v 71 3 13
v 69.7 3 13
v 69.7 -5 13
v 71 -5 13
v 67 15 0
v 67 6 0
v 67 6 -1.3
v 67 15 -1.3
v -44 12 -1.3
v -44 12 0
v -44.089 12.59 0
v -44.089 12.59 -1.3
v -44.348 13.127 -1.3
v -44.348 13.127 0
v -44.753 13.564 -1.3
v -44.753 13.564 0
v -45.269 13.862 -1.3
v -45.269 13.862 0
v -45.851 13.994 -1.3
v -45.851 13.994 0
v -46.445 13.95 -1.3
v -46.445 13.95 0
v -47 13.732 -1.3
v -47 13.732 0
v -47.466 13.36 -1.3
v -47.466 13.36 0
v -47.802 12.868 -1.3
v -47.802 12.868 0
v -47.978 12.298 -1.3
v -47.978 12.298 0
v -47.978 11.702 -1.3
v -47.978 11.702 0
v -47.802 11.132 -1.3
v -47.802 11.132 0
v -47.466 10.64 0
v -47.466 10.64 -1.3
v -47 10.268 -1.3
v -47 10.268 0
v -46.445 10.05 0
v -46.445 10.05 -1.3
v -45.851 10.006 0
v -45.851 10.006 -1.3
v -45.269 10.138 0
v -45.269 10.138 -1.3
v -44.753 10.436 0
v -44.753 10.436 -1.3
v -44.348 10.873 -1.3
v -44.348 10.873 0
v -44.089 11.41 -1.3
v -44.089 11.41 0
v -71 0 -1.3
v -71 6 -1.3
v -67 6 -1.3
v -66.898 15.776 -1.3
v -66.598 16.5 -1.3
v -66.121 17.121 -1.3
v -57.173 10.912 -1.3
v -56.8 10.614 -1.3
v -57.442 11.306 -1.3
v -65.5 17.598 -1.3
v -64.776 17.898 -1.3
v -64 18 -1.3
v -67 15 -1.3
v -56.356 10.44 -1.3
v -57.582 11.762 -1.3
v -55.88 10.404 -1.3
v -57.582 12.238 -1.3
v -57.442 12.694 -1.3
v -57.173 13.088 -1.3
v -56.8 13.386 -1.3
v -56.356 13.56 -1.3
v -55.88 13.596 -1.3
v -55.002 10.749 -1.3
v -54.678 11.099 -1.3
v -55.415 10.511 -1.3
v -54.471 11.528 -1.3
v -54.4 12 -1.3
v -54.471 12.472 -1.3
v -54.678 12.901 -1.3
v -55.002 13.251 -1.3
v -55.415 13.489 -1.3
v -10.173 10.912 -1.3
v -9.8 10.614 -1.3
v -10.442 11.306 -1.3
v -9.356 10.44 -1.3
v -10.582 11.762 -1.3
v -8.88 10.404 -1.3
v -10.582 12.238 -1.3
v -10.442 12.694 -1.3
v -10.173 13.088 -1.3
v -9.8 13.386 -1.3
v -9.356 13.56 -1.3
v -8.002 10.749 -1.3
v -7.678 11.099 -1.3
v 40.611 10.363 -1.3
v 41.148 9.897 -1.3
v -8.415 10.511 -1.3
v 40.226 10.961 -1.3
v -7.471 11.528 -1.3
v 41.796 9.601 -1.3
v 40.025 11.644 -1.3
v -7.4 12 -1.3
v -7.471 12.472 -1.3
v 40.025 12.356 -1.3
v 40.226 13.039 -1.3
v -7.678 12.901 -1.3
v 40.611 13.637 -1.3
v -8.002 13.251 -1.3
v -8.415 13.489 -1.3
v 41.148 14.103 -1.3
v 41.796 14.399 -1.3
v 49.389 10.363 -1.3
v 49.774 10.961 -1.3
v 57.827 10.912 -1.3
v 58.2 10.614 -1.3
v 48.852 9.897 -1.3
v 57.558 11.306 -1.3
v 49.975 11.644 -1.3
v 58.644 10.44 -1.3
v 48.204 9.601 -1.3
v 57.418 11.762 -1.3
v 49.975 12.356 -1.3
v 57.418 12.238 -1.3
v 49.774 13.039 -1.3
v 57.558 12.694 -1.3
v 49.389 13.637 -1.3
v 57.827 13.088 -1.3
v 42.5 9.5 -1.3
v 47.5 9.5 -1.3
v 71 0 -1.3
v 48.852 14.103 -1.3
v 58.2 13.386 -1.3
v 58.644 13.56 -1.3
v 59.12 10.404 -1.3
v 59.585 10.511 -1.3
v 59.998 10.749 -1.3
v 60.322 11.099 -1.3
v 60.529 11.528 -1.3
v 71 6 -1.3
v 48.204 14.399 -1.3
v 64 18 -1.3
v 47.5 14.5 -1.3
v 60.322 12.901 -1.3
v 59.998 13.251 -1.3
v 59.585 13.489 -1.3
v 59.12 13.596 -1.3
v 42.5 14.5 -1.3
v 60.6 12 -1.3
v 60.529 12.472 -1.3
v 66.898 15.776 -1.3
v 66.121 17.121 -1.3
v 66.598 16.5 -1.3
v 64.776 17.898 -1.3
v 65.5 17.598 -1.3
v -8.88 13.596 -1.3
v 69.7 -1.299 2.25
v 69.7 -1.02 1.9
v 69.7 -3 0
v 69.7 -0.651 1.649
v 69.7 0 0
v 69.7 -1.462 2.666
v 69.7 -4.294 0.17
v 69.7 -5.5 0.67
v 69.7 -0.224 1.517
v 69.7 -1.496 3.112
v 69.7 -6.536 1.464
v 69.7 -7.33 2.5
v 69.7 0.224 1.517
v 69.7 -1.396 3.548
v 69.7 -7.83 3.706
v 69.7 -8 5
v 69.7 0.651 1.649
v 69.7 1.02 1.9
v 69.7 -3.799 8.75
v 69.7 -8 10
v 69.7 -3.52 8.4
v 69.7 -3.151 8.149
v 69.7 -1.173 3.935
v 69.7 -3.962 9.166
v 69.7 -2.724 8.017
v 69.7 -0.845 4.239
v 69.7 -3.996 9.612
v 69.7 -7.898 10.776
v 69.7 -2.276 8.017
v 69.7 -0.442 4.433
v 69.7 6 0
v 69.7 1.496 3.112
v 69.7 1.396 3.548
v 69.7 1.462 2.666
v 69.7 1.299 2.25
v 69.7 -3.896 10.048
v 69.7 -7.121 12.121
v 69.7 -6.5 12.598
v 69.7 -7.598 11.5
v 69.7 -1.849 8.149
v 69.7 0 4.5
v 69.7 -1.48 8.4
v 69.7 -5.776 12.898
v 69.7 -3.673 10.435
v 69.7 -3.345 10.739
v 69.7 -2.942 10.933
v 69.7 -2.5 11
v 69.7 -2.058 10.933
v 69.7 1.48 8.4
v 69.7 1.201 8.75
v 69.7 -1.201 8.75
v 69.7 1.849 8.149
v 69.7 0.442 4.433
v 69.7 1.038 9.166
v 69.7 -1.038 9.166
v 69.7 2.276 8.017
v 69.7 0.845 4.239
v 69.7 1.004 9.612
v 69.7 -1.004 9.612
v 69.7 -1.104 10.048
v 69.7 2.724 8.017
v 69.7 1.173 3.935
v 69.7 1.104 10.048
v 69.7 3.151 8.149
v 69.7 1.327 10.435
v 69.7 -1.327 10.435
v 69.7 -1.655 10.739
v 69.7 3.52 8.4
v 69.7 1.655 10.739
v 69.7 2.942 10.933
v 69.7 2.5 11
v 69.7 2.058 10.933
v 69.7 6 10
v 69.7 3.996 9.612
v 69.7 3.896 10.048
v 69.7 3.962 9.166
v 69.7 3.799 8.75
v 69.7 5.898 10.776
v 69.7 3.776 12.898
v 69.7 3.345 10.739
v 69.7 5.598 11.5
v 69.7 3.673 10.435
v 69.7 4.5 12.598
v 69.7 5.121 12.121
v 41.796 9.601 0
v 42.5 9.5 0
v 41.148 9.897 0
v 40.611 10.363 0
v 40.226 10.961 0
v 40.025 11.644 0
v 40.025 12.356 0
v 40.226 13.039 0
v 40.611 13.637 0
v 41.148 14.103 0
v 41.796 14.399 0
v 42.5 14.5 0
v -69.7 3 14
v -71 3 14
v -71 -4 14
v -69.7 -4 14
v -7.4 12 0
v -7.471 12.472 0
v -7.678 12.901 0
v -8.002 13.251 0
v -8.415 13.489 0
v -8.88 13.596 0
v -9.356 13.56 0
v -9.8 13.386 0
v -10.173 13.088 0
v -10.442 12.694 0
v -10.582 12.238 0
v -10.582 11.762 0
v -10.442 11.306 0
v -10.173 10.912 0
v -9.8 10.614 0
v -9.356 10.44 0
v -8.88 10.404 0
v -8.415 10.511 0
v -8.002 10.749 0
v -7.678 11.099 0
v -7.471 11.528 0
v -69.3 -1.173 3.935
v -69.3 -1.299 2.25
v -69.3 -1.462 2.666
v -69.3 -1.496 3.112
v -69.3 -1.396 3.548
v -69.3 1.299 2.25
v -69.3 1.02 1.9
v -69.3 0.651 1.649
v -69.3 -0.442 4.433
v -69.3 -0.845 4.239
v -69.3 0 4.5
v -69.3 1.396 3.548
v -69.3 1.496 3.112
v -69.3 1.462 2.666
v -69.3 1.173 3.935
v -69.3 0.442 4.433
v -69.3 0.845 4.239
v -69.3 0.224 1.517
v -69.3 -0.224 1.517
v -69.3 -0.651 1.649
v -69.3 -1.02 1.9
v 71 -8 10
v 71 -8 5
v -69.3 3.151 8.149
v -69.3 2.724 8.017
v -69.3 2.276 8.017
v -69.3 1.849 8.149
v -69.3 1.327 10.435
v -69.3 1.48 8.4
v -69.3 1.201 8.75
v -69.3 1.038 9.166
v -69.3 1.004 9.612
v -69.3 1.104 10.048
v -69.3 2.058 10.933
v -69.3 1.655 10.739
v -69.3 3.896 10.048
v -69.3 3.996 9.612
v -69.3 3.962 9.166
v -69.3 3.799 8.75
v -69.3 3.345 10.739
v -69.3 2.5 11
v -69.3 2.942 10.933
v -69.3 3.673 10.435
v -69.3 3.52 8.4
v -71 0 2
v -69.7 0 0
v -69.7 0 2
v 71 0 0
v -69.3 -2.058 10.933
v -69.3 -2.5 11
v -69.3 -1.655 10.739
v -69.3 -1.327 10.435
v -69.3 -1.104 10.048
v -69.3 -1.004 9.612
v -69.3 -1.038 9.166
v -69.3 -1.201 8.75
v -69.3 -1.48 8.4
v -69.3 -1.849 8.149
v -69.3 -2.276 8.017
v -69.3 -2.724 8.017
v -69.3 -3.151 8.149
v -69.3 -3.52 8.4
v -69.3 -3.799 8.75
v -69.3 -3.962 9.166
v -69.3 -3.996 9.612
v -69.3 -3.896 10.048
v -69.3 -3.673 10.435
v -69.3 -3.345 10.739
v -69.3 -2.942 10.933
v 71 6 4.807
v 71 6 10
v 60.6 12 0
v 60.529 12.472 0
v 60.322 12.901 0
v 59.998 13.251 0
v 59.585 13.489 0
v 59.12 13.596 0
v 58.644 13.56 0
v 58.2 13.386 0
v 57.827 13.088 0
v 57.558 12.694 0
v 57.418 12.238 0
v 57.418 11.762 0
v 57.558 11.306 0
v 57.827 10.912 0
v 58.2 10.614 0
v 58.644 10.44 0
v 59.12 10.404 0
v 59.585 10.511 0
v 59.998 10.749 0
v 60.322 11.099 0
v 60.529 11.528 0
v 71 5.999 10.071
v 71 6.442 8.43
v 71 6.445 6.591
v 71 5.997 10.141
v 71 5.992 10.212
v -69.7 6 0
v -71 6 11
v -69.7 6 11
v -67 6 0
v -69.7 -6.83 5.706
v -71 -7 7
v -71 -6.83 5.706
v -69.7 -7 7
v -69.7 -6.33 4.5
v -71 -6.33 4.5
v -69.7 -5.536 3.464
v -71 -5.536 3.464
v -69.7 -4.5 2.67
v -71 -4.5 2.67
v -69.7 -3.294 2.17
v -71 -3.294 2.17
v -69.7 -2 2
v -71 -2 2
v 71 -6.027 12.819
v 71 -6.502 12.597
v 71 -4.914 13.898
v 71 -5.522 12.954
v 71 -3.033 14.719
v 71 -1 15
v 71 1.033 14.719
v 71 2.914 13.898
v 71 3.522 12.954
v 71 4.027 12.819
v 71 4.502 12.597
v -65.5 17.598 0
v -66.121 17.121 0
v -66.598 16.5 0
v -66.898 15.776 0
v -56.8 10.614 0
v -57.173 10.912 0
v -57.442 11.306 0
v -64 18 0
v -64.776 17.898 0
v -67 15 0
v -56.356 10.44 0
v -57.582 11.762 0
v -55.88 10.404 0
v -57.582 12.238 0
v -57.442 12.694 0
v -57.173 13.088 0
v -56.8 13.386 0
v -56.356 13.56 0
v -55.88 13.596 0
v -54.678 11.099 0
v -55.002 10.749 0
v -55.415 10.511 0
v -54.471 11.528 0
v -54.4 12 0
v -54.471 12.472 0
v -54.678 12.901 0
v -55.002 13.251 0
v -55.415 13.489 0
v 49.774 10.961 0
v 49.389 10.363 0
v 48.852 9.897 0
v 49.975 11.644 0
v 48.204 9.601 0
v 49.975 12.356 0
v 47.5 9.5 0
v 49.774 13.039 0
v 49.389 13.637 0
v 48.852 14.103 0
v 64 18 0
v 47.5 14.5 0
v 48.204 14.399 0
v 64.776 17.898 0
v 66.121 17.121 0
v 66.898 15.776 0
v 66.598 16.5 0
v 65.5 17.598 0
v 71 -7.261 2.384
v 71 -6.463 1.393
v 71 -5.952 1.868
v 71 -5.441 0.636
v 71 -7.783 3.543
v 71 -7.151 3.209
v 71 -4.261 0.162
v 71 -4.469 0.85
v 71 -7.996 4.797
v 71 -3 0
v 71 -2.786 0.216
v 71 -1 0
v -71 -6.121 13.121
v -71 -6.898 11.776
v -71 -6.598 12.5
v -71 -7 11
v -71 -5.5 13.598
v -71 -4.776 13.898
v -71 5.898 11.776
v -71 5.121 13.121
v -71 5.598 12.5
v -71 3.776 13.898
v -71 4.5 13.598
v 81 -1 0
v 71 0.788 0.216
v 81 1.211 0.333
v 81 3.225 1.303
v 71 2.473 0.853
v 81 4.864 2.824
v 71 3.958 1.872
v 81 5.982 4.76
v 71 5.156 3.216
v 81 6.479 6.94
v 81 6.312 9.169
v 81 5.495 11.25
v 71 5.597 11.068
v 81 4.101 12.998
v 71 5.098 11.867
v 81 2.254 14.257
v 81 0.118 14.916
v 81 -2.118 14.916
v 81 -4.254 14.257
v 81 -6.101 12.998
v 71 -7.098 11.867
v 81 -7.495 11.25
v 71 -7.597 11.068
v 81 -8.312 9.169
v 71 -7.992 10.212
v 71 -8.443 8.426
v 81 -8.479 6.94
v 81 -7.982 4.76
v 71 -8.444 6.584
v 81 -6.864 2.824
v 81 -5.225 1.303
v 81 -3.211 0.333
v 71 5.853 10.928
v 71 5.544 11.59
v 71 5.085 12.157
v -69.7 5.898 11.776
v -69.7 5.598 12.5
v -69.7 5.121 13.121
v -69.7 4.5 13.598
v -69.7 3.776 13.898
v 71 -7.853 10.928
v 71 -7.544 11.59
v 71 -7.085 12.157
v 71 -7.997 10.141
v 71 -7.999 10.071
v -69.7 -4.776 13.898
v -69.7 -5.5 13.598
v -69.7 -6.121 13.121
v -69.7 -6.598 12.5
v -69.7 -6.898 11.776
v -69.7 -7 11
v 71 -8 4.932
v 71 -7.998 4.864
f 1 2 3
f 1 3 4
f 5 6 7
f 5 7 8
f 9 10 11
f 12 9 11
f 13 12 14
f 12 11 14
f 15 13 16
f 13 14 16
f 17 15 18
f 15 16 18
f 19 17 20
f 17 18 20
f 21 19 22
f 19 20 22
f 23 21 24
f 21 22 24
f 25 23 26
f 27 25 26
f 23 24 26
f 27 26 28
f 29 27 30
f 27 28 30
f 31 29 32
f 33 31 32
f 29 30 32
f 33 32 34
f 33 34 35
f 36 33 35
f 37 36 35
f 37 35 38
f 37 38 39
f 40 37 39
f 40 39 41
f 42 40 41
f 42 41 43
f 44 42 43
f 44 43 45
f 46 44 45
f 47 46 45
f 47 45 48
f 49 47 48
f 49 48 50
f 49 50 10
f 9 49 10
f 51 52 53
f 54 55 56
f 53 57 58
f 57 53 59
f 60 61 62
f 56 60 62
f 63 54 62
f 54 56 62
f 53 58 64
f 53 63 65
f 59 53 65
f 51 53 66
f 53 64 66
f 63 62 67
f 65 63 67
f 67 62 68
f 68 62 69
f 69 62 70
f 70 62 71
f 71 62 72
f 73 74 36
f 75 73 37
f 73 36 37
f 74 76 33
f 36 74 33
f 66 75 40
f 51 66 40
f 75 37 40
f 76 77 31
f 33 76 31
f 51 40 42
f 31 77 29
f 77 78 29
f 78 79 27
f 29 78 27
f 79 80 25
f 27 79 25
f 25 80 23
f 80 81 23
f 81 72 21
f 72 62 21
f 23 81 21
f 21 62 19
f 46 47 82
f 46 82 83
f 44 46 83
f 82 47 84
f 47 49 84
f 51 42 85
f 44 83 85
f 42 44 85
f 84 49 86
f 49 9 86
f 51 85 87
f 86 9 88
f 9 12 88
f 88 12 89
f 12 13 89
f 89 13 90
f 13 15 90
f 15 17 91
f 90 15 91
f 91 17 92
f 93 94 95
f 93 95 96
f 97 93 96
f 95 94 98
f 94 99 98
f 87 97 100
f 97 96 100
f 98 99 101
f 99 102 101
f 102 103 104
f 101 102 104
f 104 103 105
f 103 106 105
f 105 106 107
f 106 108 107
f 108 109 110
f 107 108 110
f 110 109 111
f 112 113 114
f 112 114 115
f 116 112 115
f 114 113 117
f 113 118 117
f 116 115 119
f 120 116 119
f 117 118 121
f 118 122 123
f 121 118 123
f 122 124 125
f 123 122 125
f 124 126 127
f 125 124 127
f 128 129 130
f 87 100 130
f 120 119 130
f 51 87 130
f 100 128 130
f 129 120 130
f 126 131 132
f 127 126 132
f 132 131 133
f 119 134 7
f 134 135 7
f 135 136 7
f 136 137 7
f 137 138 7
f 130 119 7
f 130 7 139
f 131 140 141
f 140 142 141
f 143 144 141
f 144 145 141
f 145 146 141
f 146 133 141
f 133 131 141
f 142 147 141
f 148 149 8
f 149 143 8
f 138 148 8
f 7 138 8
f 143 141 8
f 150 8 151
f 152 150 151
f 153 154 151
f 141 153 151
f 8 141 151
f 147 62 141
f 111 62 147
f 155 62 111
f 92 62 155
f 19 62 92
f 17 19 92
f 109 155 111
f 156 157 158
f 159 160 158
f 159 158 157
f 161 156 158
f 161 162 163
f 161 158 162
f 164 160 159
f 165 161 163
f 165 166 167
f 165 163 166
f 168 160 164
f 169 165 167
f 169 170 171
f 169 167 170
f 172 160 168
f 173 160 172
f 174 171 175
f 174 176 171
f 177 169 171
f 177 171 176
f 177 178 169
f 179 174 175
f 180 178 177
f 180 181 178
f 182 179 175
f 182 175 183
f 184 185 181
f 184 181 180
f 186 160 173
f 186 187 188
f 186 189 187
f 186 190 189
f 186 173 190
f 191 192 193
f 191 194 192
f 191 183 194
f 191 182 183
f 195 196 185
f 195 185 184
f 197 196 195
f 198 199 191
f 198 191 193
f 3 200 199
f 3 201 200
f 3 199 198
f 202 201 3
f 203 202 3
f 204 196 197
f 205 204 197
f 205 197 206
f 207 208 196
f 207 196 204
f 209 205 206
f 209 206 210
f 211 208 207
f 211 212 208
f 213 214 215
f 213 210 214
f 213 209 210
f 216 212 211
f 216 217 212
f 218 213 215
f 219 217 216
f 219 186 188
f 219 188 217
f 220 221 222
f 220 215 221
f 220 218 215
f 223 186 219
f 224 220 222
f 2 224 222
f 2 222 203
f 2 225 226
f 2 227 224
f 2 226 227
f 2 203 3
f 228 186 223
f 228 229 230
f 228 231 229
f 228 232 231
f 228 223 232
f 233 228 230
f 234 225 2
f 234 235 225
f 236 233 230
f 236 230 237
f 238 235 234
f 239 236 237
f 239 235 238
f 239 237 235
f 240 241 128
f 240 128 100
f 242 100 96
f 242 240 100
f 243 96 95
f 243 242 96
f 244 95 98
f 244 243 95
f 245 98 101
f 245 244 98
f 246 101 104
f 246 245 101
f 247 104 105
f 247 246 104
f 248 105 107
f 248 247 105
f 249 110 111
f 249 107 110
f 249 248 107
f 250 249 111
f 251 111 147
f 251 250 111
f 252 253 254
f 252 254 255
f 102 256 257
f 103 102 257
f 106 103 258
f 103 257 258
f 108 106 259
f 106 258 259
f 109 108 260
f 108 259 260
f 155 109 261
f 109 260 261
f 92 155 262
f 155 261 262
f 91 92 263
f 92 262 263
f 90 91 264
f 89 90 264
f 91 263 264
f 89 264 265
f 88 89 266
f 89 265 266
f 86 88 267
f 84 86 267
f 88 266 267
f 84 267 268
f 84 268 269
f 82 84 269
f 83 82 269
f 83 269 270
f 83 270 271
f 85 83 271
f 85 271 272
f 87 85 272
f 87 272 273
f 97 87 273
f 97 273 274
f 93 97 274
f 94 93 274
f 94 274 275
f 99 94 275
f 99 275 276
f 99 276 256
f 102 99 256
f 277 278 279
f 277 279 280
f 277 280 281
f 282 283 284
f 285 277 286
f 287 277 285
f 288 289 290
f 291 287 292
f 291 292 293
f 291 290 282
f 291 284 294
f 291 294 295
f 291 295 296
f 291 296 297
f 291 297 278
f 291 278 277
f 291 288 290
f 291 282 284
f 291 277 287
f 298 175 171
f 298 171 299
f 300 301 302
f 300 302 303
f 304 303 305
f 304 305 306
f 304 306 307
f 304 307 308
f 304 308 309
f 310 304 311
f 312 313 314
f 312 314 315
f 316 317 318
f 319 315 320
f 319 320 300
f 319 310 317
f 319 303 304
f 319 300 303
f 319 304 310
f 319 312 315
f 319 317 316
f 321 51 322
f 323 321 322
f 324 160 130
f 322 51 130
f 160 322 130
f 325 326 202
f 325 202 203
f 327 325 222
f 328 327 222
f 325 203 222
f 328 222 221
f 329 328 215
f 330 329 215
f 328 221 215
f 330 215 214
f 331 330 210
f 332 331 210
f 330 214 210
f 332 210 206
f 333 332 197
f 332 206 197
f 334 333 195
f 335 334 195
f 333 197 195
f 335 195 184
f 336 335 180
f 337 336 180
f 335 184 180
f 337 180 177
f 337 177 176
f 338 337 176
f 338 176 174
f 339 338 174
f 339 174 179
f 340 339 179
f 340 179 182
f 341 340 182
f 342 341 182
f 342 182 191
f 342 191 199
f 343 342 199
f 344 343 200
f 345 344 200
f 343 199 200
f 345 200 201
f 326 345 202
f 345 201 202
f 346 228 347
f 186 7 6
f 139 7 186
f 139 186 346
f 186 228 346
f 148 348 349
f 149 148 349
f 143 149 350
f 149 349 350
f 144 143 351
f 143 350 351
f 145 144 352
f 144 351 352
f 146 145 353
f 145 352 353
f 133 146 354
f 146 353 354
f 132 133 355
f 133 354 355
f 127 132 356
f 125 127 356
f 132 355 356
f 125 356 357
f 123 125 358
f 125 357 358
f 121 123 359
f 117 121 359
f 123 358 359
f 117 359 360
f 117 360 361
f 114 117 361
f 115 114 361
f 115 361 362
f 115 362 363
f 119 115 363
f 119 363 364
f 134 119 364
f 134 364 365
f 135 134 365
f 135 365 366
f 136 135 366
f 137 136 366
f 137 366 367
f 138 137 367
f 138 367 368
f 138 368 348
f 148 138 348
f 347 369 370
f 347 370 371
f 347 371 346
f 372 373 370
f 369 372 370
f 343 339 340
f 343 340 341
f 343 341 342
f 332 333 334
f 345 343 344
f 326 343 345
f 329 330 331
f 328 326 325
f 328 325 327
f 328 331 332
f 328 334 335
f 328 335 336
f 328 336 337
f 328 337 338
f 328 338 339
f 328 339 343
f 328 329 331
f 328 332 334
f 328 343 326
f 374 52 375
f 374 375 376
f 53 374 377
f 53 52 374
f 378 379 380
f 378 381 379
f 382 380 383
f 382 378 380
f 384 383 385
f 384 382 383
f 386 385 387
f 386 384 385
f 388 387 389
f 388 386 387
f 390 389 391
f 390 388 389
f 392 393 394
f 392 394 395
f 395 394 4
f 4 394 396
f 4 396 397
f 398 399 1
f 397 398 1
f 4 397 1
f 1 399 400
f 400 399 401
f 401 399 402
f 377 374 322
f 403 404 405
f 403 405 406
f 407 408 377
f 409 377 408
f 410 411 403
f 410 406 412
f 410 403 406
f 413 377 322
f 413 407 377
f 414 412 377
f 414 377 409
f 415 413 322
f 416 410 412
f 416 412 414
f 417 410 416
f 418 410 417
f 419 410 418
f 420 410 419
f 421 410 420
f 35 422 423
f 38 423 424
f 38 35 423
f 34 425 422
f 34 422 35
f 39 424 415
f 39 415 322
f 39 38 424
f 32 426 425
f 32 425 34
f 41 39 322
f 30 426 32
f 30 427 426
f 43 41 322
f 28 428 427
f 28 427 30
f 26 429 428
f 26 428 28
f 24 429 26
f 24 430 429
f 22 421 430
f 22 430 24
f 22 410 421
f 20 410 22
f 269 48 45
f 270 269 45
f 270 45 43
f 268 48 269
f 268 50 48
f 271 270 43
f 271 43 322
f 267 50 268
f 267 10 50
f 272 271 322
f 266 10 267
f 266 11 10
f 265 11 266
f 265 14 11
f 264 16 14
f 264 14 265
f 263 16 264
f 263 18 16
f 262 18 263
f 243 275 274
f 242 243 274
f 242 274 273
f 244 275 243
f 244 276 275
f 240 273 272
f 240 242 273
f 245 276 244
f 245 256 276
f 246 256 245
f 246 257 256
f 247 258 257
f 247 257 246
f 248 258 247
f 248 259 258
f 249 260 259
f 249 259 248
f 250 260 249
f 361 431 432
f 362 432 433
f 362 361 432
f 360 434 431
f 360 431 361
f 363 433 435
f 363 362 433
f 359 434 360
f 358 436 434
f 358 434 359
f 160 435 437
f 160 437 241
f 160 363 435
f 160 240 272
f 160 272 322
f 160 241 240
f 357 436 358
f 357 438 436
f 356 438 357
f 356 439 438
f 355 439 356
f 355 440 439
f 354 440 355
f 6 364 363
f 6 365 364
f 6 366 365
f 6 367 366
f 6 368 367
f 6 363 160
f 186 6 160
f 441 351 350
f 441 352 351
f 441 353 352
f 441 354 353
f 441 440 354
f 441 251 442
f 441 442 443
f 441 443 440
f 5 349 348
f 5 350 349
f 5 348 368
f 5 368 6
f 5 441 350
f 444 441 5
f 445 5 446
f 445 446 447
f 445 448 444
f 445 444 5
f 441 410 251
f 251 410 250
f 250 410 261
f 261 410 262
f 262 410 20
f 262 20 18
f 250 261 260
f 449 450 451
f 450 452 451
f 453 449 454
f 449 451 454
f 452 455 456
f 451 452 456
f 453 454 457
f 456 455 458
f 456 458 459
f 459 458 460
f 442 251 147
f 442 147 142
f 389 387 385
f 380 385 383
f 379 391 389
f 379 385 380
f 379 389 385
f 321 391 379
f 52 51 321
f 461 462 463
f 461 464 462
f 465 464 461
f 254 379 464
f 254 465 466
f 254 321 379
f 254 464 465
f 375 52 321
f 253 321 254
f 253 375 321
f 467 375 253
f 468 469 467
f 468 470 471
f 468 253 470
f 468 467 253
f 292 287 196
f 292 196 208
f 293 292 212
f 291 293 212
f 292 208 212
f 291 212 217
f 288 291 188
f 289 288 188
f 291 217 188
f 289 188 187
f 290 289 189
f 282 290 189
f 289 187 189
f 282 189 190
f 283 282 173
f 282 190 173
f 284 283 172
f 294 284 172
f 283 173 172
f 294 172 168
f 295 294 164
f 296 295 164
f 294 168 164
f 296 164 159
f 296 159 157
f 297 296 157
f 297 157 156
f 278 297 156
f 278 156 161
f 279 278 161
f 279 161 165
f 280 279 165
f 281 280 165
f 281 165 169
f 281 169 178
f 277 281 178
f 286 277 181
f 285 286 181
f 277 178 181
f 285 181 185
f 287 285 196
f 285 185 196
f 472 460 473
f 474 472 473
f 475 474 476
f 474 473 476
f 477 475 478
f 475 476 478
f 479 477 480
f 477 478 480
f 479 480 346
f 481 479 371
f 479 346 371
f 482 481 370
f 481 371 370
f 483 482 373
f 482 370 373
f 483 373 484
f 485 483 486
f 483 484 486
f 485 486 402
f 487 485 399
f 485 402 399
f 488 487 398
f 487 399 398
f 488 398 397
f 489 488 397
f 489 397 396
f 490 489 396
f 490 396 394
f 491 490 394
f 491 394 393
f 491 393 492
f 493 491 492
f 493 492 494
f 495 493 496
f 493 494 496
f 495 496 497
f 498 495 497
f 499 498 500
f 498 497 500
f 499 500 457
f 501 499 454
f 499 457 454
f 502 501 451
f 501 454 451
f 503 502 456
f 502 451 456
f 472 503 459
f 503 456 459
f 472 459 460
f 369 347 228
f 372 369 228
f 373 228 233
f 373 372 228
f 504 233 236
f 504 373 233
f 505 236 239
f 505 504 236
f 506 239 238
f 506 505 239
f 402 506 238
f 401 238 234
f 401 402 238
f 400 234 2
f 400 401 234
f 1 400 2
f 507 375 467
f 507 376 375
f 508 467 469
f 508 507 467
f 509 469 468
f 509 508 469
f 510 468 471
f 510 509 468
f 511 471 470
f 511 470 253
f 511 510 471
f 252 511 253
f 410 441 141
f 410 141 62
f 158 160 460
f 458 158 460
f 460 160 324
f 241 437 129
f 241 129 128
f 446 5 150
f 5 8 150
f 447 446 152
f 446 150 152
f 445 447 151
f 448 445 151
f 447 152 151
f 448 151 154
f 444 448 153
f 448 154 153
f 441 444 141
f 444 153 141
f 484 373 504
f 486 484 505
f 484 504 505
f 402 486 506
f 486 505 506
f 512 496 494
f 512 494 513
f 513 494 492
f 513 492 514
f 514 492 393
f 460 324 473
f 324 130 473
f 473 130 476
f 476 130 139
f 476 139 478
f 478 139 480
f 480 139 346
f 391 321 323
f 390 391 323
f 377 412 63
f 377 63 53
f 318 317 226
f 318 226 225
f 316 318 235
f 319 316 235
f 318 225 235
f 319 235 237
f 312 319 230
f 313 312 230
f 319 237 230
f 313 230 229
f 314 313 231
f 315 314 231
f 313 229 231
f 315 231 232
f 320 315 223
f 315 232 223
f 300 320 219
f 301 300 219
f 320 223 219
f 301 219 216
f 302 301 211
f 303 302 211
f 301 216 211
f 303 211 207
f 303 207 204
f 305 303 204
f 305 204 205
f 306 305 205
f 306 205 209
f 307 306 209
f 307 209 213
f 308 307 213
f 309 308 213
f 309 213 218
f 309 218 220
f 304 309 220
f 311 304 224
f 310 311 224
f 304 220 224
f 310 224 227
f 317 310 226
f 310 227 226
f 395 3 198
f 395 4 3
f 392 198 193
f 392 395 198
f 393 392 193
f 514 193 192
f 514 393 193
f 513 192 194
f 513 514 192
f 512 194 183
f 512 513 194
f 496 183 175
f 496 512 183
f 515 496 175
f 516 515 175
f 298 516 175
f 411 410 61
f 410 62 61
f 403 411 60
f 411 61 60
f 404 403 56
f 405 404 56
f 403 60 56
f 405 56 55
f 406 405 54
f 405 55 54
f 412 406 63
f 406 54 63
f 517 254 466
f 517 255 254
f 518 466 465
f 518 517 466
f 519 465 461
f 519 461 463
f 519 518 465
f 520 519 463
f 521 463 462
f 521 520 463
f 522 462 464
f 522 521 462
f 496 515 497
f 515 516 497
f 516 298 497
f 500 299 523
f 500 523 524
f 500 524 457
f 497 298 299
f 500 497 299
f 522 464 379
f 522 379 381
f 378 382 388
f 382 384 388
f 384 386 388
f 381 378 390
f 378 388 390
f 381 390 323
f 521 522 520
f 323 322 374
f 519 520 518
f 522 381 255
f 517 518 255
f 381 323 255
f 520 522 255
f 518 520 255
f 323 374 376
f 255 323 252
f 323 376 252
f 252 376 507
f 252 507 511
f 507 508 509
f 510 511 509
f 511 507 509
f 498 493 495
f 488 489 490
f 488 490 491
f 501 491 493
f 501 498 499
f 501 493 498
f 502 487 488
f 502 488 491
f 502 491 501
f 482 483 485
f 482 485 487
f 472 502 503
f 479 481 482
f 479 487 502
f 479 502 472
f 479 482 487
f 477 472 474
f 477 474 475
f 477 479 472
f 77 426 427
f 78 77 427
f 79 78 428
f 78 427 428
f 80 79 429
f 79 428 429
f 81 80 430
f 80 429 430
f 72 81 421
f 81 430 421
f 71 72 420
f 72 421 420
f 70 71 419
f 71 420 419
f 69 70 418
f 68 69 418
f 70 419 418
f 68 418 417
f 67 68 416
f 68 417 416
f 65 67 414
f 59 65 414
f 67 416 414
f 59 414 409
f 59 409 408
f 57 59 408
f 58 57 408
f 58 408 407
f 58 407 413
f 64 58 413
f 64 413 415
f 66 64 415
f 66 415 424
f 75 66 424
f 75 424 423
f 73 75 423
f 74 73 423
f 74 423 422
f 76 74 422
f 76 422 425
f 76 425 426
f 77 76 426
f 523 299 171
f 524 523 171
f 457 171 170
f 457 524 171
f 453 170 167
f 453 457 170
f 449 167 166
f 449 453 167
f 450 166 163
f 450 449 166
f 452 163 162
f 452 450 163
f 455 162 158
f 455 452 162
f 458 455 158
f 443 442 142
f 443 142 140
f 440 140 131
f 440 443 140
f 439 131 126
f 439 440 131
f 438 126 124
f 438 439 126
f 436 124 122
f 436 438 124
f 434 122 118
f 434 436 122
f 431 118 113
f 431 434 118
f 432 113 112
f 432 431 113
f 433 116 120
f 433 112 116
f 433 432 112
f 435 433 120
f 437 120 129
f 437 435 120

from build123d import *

# Parameters (mm, degrees)
EXTRUDE_1_DEPTH     = 1.3
FILLET_1_R          = 3
SKETCH_2_W          = 1.3
SKETCH_2_H          = 6
EXTRUDE_2_DEPTH     = 14
FILLET_2_R          = 3
SKETCH_3_W          = 1.3
SKETCH_3_H          = 7.65
EXTRUDE_3_DEPTH     = 7
SKETCH_4_W          = 1.3
SKETCH_4_H          = 4.35
EXTRUDE_4_DEPTH     = 7
FILLET_3_R          = 3
FILLET_4_R          = 5
SKETCH_6_W          = 1.3
SKETCH_6_H          = 6
EXTRUDE_5_DEPTH     = 13
SKETCH_7_W          = 1.3
SKETCH_7_H          = 13
EXTRUDE_6_DEPTH     = 8
FILLET_5_R          = 3
FILLET_6_R          = 5
SKETCH_8_R          = 1.6
SKETCH_8_R_2        = 2
CUT_EXTRUDE_1_DEPTH = 8
SKETCH_9_R          = 7.5
EXTRUDE_7_DEPTH     = 10
SKETCH_10_R         = 1.5
EXTRUDE_10_DEPTH    = 139


with BuildPart() as part:
    # 草图1 → 凸台-拉伸1 (new body)
    with BuildSketch(Plane.XY):
        Polygon((-71, 0), (0, 0), (71, 0), (71, 6), (67, 6), (67, 18), (-67, 18), (-67, 6), (-71, 6), align=None)
    extrude(amount=-EXTRUDE_1_DEPTH)

    # 圆角1
    fillet_1_edges = [part.edges().sort_by_distance(p)[0] for p in [
        (-67, 18, -0.65),
        (67, 18, -0.65),
    ]]
    fillet(fillet_1_edges, radius=FILLET_1_R)

    # 草图2 → 凸台-拉伸2 (add)
    with BuildSketch(Plane.XY):
        with Locations((-70.35, 3)):
            Rectangle(SKETCH_2_W, SKETCH_2_H)
    extrude(amount=EXTRUDE_2_DEPTH)

    # 圆角2
    fillet_2_edges = [part.edges().sort_by_distance(p)[0] for p in [
        (-70.35, 6, 14),
    ]]
    fillet(fillet_2_edges, radius=FILLET_2_R)

    # 草图3 → 凸台-拉伸3 (add)
    with BuildSketch(Plane.XZ):
        with Locations((-70.35, 10.175)):
            Rectangle(SKETCH_3_W, SKETCH_3_H)
    extrude(amount=EXTRUDE_3_DEPTH)

    # 草图4 → 凸台-拉伸4 (add)
    with BuildSketch(Plane.XZ):
        with Locations((-70.35, 4.175)):
            Rectangle(SKETCH_4_W, SKETCH_4_H)
    extrude(amount=EXTRUDE_4_DEPTH)

    # 圆角3
    fillet_3_edges = [part.edges().sort_by_distance(p)[0] for p in [
        (-70.35, -7, 14),
    ]]
    fillet(fillet_3_edges, radius=FILLET_3_R)

    # 圆角4
    fillet_4_edges = [part.edges().sort_by_distance(p)[0] for p in [
        (-70.35, -7, 2),
    ]]
    fillet(fillet_4_edges, radius=FILLET_4_R)

    # 草图6 → 凸台-拉伸5 (add)
    with BuildSketch(Plane.XY):
        with Locations((70.35, 3)):
            Rectangle(SKETCH_6_W, SKETCH_6_H)
    extrude(amount=EXTRUDE_5_DEPTH)

    # 草图7 → 凸台-拉伸6 (add)
    with BuildSketch(Plane.XZ):
        with Locations((70.35, 6.5)):
            Rectangle(SKETCH_7_W, SKETCH_7_H)
    extrude(amount=EXTRUDE_6_DEPTH)

    # 圆角5
    fillet_5_edges = [part.edges().sort_by_distance(p)[0] for p in [
        (70.35, 6, 13),
        (70.35, -8, 13),
    ]]
    fillet(fillet_5_edges, radius=FILLET_5_R)

    # 圆角6
    fillet_6_edges = [part.edges().sort_by_distance(p)[0] for p in [
        (70.35, -8, 0),
    ]]
    fillet(fillet_6_edges, radius=FILLET_6_R)

    # 草图8 → 切除-拉伸1 (cut)
    with BuildSketch(Plane.XY):
        with Locations((-56, 12)):
            Circle(SKETCH_8_R)
        with Locations((-46, 12)):
            Circle(SKETCH_8_R_2)
        with Locations((-9, 12)):
            Circle(SKETCH_8_R)
        with Locations((59, 12)):
            Circle(SKETCH_8_R)
        with BuildLine():
            Line((42.5, 14.5), (47.5, 14.5))
            ThreePointArc((47.5, 14.5), (50, 12), (47.5, 9.5))
            Line((47.5, 9.5), (42.5, 9.5))
            ThreePointArc((42.5, 9.5), (40, 12), (42.5, 14.5))
        make_face()
    extrude(amount=-CUT_EXTRUDE_1_DEPTH, mode=Mode.SUBTRACT)

    # 草图9 → 凸台-拉伸7 (add)
    with BuildSketch(Plane(origin=(71, 0, 0), x_dir=(0, 0, -1), z_dir=(1, 0, 0))):
        with Locations((-7.5, -1)):
            Circle(SKETCH_9_R)
    extrude(amount=EXTRUDE_7_DEPTH)

    # 草图10 → 凸台-拉伸10 (add)
    with BuildSketch(Plane.ZY.offset(-69.7)):
        with Locations((9.5, 2.5)):
            Circle(SKETCH_10_R)
        with Locations((9.5, -2.5)):
            Circle(SKETCH_10_R)
        with Locations((3, 0)):
            Circle(SKETCH_10_R)
    extrude(amount=EXTRUDE_10_DEPTH)


solid = part.part
